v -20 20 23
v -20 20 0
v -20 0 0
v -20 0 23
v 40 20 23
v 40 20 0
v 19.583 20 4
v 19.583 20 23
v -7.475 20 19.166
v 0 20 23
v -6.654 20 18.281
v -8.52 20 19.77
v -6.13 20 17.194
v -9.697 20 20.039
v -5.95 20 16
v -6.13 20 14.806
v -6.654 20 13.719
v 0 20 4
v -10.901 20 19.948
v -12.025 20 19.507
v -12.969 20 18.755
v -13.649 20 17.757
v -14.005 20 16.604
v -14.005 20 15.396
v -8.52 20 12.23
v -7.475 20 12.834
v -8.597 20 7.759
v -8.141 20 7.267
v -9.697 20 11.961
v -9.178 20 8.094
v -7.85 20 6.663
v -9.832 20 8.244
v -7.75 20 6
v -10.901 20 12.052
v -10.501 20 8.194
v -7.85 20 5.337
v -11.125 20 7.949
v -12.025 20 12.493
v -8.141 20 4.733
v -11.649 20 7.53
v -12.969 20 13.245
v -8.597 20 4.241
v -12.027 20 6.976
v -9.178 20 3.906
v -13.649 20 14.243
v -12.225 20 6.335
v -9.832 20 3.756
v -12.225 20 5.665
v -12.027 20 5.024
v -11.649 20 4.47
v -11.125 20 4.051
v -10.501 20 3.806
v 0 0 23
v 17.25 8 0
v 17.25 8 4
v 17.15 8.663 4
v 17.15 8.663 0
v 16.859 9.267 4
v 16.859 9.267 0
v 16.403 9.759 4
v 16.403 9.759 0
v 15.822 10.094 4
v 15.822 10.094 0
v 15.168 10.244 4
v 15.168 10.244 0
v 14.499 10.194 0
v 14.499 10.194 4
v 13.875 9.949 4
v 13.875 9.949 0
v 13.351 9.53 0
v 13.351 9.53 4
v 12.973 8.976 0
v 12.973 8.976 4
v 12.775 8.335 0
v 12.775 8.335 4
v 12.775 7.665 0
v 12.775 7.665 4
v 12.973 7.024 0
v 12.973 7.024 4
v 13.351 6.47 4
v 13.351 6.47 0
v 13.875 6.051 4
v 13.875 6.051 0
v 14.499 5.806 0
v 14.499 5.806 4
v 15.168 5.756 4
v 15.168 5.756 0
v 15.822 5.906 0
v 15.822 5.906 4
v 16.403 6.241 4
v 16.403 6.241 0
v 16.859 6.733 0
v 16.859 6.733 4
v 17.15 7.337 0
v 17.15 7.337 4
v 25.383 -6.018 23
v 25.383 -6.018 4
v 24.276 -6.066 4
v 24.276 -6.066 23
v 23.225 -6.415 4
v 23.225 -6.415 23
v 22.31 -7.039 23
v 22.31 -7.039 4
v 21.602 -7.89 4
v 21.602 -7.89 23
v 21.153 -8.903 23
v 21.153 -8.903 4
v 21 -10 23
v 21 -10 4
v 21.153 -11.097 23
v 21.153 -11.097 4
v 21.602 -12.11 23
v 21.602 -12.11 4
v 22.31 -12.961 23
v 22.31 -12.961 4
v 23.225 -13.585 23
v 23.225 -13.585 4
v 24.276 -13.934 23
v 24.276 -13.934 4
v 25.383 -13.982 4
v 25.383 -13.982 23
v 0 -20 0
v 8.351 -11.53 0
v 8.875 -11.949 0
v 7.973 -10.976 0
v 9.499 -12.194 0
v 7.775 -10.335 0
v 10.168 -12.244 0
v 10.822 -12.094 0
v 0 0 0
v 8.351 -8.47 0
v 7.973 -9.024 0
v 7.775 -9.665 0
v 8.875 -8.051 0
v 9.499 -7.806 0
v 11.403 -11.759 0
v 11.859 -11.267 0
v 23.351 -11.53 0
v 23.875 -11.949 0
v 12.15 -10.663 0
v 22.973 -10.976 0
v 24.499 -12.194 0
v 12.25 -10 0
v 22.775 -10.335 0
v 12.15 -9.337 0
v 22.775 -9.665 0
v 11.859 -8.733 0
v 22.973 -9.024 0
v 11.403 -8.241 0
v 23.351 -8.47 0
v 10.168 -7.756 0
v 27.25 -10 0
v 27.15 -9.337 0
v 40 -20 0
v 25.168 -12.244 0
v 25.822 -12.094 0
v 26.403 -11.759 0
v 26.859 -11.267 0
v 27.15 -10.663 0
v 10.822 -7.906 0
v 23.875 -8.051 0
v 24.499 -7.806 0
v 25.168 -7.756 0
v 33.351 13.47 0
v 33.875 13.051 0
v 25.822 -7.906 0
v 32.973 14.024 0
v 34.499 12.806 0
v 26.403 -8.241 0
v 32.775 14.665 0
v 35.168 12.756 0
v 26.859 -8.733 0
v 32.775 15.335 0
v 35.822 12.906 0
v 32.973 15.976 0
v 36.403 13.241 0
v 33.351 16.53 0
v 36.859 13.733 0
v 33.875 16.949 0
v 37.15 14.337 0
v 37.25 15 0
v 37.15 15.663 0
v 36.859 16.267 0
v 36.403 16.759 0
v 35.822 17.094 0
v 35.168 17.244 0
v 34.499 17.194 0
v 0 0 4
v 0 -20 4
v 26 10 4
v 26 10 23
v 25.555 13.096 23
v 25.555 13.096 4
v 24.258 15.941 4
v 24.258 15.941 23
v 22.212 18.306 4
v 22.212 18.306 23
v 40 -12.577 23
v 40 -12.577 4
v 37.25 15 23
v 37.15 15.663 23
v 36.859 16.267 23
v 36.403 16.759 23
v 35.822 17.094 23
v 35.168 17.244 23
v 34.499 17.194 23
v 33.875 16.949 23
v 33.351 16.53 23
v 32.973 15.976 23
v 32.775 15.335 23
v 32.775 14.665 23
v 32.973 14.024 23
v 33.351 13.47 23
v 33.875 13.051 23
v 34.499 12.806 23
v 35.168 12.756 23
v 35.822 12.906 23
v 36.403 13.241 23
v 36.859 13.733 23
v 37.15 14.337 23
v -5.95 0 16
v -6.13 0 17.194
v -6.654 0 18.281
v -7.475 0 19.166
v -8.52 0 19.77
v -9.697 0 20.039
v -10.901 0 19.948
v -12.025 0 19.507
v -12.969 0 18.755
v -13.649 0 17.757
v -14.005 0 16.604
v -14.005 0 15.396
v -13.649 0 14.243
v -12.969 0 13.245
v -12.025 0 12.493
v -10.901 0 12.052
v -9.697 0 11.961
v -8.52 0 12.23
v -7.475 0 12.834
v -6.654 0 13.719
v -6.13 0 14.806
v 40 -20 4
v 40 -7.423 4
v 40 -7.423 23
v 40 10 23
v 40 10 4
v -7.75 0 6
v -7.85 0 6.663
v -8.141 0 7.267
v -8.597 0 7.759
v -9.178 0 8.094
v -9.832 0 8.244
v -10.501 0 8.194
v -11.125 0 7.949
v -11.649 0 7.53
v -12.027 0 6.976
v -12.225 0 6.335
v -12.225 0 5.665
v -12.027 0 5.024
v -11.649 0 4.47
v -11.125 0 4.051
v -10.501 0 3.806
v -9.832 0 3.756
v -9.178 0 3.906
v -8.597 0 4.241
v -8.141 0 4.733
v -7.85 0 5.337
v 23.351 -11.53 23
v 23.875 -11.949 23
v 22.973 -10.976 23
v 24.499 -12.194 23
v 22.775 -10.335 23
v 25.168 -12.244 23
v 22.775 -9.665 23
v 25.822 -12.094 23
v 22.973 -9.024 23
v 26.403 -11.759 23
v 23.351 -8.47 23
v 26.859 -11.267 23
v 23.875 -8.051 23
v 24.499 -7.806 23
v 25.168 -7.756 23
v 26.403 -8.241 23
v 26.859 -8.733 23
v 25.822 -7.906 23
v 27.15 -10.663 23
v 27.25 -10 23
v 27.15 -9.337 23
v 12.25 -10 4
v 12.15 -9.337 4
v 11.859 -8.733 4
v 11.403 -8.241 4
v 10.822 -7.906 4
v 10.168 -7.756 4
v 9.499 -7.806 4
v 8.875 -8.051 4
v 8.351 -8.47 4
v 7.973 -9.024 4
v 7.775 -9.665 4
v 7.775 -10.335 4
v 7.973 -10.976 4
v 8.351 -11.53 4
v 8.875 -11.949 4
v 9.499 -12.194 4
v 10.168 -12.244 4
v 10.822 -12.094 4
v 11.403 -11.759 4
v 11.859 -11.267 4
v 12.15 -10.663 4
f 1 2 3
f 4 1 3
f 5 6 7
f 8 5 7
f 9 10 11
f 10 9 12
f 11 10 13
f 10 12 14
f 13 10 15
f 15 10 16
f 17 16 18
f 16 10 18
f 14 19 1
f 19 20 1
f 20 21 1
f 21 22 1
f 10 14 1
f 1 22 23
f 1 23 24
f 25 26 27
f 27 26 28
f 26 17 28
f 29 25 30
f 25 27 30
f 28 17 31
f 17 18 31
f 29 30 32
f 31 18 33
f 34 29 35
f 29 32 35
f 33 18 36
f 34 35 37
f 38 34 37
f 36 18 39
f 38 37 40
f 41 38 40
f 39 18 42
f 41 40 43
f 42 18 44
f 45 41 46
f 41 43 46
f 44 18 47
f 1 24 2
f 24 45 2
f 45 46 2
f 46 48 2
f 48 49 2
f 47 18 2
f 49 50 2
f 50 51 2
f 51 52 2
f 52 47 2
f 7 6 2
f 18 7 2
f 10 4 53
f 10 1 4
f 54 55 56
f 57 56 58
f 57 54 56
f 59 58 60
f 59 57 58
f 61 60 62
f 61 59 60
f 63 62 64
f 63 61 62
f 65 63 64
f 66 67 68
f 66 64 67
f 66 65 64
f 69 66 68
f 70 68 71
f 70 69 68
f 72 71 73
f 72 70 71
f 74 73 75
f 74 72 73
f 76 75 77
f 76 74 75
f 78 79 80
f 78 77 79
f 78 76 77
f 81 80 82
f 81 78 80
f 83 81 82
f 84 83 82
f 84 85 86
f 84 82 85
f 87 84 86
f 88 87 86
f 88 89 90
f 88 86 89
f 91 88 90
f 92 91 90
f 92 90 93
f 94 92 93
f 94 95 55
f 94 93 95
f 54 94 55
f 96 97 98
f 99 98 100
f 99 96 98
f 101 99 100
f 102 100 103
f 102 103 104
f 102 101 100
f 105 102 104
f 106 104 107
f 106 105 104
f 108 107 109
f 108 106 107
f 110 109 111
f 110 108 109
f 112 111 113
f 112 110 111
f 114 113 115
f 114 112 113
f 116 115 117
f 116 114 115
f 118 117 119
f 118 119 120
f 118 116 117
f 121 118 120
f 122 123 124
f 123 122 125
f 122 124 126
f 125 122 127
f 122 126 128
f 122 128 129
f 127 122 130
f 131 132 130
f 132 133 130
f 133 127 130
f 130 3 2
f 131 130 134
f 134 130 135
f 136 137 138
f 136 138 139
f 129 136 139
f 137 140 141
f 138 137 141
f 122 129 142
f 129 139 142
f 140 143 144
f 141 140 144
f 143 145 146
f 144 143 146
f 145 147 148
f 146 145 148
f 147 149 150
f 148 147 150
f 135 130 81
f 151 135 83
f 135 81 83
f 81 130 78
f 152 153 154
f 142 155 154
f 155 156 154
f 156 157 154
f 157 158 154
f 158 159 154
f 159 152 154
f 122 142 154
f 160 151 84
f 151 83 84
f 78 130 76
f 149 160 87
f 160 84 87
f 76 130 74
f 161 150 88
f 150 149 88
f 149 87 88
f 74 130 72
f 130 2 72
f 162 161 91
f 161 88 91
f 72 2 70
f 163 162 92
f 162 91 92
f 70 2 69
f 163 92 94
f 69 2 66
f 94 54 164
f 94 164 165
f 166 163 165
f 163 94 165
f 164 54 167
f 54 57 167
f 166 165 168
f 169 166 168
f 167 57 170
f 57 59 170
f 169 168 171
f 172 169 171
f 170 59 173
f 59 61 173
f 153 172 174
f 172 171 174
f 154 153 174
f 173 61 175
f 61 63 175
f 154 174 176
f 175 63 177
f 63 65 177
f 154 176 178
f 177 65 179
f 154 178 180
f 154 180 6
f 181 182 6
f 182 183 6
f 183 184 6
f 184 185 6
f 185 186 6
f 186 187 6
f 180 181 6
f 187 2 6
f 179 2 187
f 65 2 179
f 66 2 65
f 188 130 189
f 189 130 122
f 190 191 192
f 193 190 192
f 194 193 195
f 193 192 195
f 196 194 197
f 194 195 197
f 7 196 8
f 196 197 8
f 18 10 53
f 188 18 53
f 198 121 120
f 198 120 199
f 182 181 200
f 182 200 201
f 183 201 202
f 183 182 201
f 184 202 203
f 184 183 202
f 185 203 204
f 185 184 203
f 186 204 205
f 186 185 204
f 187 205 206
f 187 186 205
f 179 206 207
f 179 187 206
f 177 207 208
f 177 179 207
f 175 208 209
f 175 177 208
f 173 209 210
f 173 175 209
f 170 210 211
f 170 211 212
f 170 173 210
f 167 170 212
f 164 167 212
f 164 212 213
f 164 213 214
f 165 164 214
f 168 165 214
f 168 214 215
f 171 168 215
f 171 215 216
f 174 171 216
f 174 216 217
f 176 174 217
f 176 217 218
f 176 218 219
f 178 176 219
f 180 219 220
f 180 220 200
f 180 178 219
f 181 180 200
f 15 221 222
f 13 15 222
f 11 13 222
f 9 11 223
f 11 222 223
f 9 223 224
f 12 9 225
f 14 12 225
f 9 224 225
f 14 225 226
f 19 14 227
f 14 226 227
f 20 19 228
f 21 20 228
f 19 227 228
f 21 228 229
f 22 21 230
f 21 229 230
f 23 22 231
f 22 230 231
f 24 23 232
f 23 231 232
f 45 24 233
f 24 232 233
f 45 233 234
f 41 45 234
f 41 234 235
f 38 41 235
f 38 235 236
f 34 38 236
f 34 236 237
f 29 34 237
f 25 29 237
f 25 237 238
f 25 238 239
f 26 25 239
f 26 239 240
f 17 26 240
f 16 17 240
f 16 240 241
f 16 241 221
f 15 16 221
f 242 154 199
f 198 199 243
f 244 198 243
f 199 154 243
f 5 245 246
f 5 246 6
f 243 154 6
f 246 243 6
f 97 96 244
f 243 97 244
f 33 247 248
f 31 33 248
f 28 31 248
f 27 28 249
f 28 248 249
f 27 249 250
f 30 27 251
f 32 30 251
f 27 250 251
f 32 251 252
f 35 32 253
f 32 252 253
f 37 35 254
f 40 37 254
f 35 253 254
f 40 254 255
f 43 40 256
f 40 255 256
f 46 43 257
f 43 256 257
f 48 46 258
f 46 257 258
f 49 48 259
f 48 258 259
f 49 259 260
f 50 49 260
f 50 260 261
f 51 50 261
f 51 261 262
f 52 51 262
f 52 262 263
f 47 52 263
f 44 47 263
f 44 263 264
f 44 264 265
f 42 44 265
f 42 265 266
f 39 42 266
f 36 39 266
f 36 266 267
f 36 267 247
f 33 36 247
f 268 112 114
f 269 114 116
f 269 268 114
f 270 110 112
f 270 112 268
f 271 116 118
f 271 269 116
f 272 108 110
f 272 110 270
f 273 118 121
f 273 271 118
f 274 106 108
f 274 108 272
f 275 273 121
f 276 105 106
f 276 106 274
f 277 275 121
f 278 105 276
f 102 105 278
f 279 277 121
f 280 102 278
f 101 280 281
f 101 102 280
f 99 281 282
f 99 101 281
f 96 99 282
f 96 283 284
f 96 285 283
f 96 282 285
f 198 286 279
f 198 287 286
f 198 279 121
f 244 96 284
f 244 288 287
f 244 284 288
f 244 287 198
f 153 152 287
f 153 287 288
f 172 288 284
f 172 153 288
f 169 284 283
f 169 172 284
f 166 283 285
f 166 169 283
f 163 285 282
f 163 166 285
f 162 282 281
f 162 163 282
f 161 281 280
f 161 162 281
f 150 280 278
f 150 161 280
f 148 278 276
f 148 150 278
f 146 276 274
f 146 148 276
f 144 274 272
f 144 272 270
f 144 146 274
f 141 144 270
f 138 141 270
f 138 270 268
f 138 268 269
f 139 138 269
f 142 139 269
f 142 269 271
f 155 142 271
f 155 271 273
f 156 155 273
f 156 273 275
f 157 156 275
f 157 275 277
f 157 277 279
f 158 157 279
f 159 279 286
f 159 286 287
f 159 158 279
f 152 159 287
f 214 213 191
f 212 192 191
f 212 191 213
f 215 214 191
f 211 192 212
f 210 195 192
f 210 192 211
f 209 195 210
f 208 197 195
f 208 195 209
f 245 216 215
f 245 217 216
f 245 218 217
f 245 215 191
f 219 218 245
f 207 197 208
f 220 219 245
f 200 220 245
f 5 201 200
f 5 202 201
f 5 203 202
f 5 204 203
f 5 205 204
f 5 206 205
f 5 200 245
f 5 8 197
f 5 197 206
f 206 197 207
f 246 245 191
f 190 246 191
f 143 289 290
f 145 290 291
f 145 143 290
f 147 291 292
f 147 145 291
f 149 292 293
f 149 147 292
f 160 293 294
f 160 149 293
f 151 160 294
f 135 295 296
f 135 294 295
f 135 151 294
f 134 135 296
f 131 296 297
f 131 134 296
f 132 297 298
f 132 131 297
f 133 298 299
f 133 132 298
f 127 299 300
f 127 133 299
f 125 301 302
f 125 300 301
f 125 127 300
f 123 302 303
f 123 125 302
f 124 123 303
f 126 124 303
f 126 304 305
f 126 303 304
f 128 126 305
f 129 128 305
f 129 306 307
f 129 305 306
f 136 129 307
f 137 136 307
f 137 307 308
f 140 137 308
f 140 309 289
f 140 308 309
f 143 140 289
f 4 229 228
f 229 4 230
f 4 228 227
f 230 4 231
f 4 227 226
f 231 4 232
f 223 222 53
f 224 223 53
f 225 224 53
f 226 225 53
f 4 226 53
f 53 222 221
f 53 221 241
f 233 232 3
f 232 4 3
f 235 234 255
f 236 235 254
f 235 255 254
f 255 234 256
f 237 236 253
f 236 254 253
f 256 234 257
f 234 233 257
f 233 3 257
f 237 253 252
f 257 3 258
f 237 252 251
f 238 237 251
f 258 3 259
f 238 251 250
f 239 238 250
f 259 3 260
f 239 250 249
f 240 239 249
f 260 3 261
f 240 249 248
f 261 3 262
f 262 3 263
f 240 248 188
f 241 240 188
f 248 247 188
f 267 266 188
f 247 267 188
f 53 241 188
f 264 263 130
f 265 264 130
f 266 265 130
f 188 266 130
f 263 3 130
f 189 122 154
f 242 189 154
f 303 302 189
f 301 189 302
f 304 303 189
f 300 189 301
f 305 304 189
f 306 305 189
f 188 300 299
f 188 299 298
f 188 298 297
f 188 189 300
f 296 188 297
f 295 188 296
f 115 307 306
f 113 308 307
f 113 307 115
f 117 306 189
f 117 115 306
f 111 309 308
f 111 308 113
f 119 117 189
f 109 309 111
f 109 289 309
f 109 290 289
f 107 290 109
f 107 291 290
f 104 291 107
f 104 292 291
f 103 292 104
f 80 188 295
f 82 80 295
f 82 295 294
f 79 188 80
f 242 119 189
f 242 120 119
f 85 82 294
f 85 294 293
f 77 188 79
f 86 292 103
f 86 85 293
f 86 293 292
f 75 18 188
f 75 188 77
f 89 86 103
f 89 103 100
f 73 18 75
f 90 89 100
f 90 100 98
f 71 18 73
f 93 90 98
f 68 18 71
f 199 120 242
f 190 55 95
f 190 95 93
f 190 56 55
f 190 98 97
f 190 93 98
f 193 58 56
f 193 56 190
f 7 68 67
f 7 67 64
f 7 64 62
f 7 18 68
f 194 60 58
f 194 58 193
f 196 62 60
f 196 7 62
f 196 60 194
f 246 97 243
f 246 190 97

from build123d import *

# Parameters (mm, degrees)
SKETCH_R        = 2.25
PAD_DEPTH       = 23
POCKET_DEPTH    = 19
SKETCH002_R     = 4.05
SKETCH002_R_2   = 2.25
POCKET001_DEPTH = 20.001


with BuildPart() as part:
    # Sketch → Pad (new body)
    with BuildSketch(Plane.XY):
        Polygon((0, -20), (40, -20), (40, 20), (-20, 20), (-20, 0), (0, 0), align=None)
        with Locations((15, 8)):
            Circle(SKETCH_R, mode=Mode.SUBTRACT)
        with Locations((10, -10)):
            Circle(SKETCH_R, mode=Mode.SUBTRACT)
        with Locations((25, -10)):
            Circle(SKETCH_R, mode=Mode.SUBTRACT)
        with Locations((35, 15)):
            Circle(SKETCH_R, mode=Mode.SUBTRACT)
    extrude(amount=PAD_DEPTH)

    # Sketch001 → Pocket (cut)
    with BuildSketch(Plane.XY.offset(23)):
        with BuildLine():
            Line((46, 10), (26, 10))
            ThreePointArc((26, 10), (22.778175, 17.778175), (15, 21))
            Line((15, 21), (0, 21))
            Line((0, 21), (0, -23))
            Line((0, -23), (46, -23))
            Line((46, -23), (46, -12))
            Line((25.382674, -13.981653), (46, -12))
            ThreePointArc((25.382674, -6.018347), (21, -10), (25.382674, -13.981653))
            Line((25.382674, -6.018347), (46, -8))
            Line((46, -8), (46, 10))
        make_face()
    extrude(amount=-POCKET_DEPTH, mode=Mode.SUBTRACT)

    # Sketch002 → Pocket001 (cut, through all)
    with BuildSketch(Plane.XZ):
        with Locations((-10, 16)):
            Circle(SKETCH002_R)
        with Locations((-10, 6)):
            Circle(SKETCH002_R_2)
    extrude(amount=-POCKET001_DEPTH, mode=Mode.SUBTRACT)


solid = part.part
